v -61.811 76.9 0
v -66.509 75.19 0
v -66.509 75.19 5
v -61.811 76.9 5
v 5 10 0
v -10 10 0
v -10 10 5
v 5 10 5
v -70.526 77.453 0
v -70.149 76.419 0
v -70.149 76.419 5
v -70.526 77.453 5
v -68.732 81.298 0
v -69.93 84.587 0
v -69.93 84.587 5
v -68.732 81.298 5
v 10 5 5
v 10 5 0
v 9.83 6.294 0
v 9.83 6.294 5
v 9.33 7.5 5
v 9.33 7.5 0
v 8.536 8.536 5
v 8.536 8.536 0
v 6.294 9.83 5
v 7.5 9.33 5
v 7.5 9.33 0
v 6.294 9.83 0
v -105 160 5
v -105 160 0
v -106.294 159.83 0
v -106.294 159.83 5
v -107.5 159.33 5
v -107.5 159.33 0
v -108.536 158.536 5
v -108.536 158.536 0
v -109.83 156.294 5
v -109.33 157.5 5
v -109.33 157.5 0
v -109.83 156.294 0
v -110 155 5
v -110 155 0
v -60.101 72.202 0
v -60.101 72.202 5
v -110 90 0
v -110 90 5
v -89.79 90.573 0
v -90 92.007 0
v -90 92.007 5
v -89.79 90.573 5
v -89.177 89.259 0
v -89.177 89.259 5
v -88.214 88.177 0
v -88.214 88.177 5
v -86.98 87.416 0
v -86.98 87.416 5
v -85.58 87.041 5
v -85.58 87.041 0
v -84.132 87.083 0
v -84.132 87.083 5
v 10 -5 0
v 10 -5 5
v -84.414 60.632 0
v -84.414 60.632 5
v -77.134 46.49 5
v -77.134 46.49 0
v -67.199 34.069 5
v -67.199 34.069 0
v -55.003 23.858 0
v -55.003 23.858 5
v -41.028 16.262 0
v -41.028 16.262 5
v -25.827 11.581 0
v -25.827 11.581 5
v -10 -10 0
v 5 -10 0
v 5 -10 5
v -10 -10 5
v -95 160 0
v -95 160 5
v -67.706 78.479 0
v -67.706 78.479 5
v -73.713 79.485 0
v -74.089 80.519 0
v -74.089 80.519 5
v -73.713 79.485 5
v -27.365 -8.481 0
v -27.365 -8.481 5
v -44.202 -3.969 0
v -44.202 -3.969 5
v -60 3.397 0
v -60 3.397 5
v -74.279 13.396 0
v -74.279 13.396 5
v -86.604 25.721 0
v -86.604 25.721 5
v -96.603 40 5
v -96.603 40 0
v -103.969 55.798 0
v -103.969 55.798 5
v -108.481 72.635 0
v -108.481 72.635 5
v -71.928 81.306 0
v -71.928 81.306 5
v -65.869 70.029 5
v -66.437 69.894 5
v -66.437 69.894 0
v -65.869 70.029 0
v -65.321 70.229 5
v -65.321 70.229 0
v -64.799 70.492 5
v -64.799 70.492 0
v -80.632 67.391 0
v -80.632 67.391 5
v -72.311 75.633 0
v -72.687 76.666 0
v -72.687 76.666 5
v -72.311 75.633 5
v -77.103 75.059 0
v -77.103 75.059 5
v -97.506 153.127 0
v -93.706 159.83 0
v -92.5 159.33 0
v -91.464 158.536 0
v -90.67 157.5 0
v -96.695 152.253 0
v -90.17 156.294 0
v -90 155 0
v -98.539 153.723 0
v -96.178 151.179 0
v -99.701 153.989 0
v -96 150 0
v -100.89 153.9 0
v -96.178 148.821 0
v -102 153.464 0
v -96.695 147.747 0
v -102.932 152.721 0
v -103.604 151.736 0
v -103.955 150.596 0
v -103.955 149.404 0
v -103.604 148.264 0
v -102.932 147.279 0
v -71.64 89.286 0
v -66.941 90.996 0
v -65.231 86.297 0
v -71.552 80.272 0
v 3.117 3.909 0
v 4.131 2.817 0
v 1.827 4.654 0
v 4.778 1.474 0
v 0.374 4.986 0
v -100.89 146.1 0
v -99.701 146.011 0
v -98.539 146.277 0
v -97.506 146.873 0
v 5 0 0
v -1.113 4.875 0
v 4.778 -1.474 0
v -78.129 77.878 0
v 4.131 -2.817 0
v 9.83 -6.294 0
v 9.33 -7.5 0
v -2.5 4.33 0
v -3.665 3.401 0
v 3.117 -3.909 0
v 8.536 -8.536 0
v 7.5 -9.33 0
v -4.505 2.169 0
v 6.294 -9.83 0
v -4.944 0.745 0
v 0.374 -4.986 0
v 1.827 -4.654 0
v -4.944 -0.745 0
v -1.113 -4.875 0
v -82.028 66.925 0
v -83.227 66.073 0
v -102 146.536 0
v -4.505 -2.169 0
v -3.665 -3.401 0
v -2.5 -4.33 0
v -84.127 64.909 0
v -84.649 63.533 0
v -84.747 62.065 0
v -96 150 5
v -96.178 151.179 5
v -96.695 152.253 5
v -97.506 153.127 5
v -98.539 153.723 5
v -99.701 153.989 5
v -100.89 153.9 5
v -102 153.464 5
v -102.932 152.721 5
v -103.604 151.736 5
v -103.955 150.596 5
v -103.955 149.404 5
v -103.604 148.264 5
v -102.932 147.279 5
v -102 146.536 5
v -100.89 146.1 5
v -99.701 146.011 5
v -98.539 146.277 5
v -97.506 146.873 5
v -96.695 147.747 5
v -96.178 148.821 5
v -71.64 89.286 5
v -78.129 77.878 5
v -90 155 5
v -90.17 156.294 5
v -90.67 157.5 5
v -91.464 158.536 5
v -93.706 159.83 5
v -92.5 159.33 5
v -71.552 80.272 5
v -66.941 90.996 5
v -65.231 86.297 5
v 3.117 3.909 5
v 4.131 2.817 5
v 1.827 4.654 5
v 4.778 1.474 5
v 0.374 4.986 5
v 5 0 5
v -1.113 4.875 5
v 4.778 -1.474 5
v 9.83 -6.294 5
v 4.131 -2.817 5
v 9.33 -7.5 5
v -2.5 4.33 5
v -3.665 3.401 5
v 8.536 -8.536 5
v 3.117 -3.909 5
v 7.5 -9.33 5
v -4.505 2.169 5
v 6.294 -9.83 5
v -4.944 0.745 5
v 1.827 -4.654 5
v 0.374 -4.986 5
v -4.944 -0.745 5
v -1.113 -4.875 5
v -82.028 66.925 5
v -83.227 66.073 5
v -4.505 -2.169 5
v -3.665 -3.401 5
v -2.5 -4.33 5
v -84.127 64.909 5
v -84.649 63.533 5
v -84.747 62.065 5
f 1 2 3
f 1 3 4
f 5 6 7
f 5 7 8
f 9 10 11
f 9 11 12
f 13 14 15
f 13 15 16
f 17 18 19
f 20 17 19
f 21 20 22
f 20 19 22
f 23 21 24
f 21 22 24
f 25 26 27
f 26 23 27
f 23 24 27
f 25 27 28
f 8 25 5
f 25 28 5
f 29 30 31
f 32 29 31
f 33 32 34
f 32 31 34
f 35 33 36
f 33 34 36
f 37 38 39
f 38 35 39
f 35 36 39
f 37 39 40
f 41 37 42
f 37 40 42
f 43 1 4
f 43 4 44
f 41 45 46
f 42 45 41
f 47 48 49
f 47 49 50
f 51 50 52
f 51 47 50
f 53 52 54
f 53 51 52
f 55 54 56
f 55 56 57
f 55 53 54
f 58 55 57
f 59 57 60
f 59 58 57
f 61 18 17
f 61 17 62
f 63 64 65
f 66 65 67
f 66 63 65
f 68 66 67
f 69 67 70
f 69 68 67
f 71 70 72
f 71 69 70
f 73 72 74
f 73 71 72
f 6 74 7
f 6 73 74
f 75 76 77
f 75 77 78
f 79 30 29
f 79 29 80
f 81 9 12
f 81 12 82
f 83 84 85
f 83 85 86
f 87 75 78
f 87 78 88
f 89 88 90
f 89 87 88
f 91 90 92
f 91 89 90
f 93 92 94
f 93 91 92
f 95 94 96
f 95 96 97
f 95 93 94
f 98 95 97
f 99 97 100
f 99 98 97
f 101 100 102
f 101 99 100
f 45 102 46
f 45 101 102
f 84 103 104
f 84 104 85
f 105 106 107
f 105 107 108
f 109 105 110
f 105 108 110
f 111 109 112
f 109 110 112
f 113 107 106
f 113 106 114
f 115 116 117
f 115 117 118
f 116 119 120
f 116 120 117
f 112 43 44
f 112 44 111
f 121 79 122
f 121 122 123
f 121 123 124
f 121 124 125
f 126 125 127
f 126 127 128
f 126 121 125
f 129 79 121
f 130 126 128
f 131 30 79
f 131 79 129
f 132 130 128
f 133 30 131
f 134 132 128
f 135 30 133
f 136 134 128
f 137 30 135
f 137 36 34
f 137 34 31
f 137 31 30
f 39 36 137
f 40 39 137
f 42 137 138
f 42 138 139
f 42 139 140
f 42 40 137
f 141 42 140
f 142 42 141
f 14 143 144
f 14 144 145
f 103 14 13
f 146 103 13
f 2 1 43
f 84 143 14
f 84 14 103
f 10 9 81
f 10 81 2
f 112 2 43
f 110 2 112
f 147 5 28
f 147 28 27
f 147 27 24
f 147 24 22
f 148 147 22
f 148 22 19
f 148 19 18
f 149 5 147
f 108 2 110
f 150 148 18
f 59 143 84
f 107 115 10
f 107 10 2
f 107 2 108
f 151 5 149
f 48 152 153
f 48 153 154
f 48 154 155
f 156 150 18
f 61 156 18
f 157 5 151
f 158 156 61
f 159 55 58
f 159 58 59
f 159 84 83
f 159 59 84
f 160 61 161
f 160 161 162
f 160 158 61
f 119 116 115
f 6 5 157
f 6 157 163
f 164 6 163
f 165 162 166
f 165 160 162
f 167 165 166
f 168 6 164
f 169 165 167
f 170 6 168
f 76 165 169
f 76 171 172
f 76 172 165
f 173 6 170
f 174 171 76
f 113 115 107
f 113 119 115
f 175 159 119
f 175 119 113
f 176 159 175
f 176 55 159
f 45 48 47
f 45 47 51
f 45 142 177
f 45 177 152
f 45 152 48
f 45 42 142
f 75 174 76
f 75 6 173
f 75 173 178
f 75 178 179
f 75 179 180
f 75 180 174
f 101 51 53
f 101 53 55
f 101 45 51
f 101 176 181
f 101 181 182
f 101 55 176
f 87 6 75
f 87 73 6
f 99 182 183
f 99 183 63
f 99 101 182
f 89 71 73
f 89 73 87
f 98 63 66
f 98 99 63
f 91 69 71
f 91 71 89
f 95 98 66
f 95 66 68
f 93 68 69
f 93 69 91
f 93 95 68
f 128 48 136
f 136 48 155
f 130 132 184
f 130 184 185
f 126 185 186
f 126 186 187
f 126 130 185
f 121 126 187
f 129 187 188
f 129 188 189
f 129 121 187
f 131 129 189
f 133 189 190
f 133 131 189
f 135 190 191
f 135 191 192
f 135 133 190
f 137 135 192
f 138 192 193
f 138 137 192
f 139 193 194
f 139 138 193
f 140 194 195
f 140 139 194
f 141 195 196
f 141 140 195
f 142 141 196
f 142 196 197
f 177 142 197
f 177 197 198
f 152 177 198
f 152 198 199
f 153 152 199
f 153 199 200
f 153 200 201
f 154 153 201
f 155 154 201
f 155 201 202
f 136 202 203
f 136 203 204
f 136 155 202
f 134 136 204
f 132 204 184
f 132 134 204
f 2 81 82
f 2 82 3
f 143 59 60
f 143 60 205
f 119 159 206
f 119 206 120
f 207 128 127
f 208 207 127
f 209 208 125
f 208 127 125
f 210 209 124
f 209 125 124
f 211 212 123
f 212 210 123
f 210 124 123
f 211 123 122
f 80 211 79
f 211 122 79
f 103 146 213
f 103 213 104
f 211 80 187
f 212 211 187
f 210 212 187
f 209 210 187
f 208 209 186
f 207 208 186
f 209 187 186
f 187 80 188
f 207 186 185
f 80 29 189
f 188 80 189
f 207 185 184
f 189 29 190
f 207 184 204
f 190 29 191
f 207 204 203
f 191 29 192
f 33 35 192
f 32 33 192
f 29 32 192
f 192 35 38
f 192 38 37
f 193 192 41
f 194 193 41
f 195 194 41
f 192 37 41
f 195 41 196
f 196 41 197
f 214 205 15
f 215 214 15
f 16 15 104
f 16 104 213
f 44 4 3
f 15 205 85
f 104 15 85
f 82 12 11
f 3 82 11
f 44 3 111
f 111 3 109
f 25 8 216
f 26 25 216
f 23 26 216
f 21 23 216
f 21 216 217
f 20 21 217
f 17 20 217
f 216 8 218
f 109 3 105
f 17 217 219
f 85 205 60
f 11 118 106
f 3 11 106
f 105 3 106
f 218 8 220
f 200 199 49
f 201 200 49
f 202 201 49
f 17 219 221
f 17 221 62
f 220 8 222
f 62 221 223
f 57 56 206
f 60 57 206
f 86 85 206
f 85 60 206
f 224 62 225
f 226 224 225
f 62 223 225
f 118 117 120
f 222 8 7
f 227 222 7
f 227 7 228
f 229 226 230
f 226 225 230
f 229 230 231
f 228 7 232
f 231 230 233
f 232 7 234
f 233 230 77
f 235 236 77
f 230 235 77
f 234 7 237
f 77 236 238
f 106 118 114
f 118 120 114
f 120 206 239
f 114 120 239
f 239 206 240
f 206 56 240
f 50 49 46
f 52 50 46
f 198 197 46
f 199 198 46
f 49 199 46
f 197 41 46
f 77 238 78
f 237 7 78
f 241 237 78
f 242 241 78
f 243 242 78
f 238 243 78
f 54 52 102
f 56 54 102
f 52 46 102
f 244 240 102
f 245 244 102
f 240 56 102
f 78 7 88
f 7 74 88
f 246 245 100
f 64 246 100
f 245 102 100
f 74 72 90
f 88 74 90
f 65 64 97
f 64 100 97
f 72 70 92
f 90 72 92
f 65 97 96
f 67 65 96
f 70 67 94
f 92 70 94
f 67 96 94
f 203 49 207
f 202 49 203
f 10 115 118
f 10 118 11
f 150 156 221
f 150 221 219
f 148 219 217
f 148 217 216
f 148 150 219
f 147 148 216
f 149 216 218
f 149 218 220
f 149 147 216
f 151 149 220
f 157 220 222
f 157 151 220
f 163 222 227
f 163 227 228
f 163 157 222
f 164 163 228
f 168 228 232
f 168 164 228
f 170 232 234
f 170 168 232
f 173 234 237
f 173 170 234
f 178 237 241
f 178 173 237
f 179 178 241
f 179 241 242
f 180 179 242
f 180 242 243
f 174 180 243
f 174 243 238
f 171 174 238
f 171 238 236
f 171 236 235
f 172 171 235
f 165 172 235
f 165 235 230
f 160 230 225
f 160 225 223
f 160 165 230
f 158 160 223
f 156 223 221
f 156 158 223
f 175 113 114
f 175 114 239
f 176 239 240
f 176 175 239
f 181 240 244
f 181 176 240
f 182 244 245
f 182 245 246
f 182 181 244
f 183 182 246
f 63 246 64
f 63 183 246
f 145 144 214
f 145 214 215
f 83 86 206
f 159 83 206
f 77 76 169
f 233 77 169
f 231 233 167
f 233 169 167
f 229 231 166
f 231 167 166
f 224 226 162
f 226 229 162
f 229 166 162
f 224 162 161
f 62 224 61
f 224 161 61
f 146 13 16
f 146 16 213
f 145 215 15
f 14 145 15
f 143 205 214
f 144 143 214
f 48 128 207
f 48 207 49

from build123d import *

# Parameters (mm, degrees)
SKETCH1_R           = 5
SKETCH1_R_2         = 4
BOSS_EXTRUDE1_DEPTH = 5
FILLET3_R           = 5


with BuildPart() as part:
    # Sketch1 → Boss-Extrude1 (new body)
    with BuildSketch(Plane.XY):
        with BuildLine():
            Line((-10, 10), (10, 10))
            Line((10, 10), (10, -10))
            Line((10, -10), (-10, -10))
            ThreePointArc((-10, -10), (-80.710678119, 19.289321881), (-110, 90))
            Line((-110, 90), (-110, 160))
            Line((-110, 160), (-90, 160))
            Line((-90, 160), (-90, 90))
            ThreePointArc((-90, 90), (-89.975789808, 88.031994787), (-89.903173887, 86.065180718))
            Line((-89.903173887, 86.065180718), (-71.639655664, 89.285531744))
            Line((-71.639655664, 89.285531744), (-66.94119256, 90.99563246))
            Line((-66.94119256, 90.99563246), (-65.231091843, 86.297169356))
            Line((-65.231091843, 86.297169356), (-69.929554947, 84.58706864))
            Line((-69.929554947, 84.58706864), (-68.732484445, 81.298144467))
            Line((-68.732484445, 81.298144467), (-71.551562308, 80.272084037))
            Line((-71.551562308, 80.272084037), (-71.927784465, 81.30574592))
            Line((-71.927784465, 81.30574592), (-74.089077493, 80.51909959))
            Line((-74.089077493, 80.51909959), (-73.712855336, 79.485437707))
            Line((-73.712855336, 79.485437707), (-78.129410653, 77.877943034))
            Line((-78.129410653, 77.877943034), (-77.103350223, 75.058865171))
            Line((-77.103350223, 75.058865171), (-72.686794906, 76.666359845))
            Line((-72.686794906, 76.666359845), (-72.310572748, 75.632697962))
            Line((-72.310572748, 75.632697962), (-70.14927972, 76.419344292))
            Line((-70.14927972, 76.419344292), (-70.525501878, 77.453006175))
            Line((-70.525501878, 77.453006175), (-67.706424015, 78.479066605))
            Line((-67.706424015, 78.479066605), (-66.509353514, 75.190142432))
            Line((-66.509353514, 75.190142432), (-61.81089041, 76.900243149))
            Line((-61.81089041, 76.900243149), (-60.100789693, 72.201780045))
            Line((-60.100789693, 72.201780045), (-64.799252797, 70.491679328))
            Line((-64.799252797, 70.491679328), (-64.693728557, 70.201753861))
            Line((-64.693728557, 70.201753861), (-86.430210334, 66.369025658))
            ThreePointArc((-86.430210334, 66.369025658), (-57.484324006, 25.616469702), (-10, 10))
        make_face()
        Circle(SKETCH1_R, mode=Mode.SUBTRACT)
        with Locations((-100, 150)):
            Circle(SKETCH1_R_2, mode=Mode.SUBTRACT)
    extrude(amount=BOSS_EXTRUDE1_DEPTH)

    # Fillet3
    # the kernel refuses this fillet: 5 mm, written as the material it adds along each edge
    with BuildSketch(Plane(origin=(-86.430210334, 66.369025658, 0), x_dir=(0.9848077530122086, 0.17364817766692744, 0), z_dir=(0, 0, 1))) as fillet3_piece_1:
        with BuildLine():
            CenterArc((5.887847048, -5), FILLET3_R, 90, 101.536959033)
            ThreePointArc((0.988867563, -6), (0.437404346, -3.009399093), (0, 0))
            Line((0, 0), (5.887847048, 0))
        make_face()
    extrude(amount=5)
    with BuildSketch(Plane(origin=(-89.903173887, 86.065180718, 0), x_dir=(-0.01629387917599103, 0.9998672459388787, 0), z_dir=(0, 0, 1))) as fillet3_piece_2:
        with BuildLine():
            CenterArc((5.8610144, -4.99933623), FILLET3_R, 89.066388177, 100)
            Line((0.923482309, -5.787230163), (0.4297291, -5.866019556))
            Line((0.4297291, -5.866019556), (-0.493753209, -0.078789393))
            Line((-0.493753209, -0.078789393), (-0.016452277, 0.499729249))
            ThreePointArc((-0.016452277, 0.499729249), (3.944021531, 0.532633412), (5.950630735, 0.499933623))
            Line((5.950630735, 0.499933623), (5.942483796, 0))
        make_face()
    extrude(amount=5)
    # the kernel refuses this fillet: 5 mm, written as the material it takes off along each edge
    with BuildSketch(Plane(origin=(10, -10, -12.5), x_dir=(0, 1, 0), z_dir=(0, 0, 1)), Plane(origin=(10, 10, -12.5), x_dir=(-1, 0, 0), z_dir=(0, 0, 1))) as fillet3_2_piece_1:
        with BuildLine():
            CenterArc((FILLET3_R, FILLET3_R), FILLET3_R, 180, 90)
            Line((0, FILLET3_R), (0, 0))
            Line((0, 0), (FILLET3_R, 0))
        make_face()
    extrude(amount=30, mode=Mode.SUBTRACT)
    with BuildSketch(Plane(origin=(-90, 160, -12.5), x_dir=(0, -1, 0), z_dir=(0, 0, 1)), Plane(origin=(-110, 160, -12.5), x_dir=(1, 0, 0), z_dir=(0, 0, 1))) as fillet3_2_piece_2:
        with BuildLine():
            CenterArc((FILLET3_R, -FILLET3_R), FILLET3_R, 90, 90)
            Line((0, -FILLET3_R), (0, 0))
            Line((0, 0), (FILLET3_R, 0))
        make_face()
    extrude(amount=30, mode=Mode.SUBTRACT)
    with BuildSketch(Plane(origin=(-64.693728557, 70.201753861, -4.425012024), x_dir=(-0.9848077530122087, -0.17364817766692653, 0), z_dir=(0, 0, 1))) as fillet3_2_piece_3:
        with BuildLine():
            CenterArc((1.77000481, -5), FILLET3_R, 90, 20.077186637)
            Line((0.053576061, -0.30384494), (0, 0))
            Line((0, 0), (1.77000481, 0))
        make_face()
    extrude(amount=13.850024049, mode=Mode.SUBTRACT)


solid = part.part
